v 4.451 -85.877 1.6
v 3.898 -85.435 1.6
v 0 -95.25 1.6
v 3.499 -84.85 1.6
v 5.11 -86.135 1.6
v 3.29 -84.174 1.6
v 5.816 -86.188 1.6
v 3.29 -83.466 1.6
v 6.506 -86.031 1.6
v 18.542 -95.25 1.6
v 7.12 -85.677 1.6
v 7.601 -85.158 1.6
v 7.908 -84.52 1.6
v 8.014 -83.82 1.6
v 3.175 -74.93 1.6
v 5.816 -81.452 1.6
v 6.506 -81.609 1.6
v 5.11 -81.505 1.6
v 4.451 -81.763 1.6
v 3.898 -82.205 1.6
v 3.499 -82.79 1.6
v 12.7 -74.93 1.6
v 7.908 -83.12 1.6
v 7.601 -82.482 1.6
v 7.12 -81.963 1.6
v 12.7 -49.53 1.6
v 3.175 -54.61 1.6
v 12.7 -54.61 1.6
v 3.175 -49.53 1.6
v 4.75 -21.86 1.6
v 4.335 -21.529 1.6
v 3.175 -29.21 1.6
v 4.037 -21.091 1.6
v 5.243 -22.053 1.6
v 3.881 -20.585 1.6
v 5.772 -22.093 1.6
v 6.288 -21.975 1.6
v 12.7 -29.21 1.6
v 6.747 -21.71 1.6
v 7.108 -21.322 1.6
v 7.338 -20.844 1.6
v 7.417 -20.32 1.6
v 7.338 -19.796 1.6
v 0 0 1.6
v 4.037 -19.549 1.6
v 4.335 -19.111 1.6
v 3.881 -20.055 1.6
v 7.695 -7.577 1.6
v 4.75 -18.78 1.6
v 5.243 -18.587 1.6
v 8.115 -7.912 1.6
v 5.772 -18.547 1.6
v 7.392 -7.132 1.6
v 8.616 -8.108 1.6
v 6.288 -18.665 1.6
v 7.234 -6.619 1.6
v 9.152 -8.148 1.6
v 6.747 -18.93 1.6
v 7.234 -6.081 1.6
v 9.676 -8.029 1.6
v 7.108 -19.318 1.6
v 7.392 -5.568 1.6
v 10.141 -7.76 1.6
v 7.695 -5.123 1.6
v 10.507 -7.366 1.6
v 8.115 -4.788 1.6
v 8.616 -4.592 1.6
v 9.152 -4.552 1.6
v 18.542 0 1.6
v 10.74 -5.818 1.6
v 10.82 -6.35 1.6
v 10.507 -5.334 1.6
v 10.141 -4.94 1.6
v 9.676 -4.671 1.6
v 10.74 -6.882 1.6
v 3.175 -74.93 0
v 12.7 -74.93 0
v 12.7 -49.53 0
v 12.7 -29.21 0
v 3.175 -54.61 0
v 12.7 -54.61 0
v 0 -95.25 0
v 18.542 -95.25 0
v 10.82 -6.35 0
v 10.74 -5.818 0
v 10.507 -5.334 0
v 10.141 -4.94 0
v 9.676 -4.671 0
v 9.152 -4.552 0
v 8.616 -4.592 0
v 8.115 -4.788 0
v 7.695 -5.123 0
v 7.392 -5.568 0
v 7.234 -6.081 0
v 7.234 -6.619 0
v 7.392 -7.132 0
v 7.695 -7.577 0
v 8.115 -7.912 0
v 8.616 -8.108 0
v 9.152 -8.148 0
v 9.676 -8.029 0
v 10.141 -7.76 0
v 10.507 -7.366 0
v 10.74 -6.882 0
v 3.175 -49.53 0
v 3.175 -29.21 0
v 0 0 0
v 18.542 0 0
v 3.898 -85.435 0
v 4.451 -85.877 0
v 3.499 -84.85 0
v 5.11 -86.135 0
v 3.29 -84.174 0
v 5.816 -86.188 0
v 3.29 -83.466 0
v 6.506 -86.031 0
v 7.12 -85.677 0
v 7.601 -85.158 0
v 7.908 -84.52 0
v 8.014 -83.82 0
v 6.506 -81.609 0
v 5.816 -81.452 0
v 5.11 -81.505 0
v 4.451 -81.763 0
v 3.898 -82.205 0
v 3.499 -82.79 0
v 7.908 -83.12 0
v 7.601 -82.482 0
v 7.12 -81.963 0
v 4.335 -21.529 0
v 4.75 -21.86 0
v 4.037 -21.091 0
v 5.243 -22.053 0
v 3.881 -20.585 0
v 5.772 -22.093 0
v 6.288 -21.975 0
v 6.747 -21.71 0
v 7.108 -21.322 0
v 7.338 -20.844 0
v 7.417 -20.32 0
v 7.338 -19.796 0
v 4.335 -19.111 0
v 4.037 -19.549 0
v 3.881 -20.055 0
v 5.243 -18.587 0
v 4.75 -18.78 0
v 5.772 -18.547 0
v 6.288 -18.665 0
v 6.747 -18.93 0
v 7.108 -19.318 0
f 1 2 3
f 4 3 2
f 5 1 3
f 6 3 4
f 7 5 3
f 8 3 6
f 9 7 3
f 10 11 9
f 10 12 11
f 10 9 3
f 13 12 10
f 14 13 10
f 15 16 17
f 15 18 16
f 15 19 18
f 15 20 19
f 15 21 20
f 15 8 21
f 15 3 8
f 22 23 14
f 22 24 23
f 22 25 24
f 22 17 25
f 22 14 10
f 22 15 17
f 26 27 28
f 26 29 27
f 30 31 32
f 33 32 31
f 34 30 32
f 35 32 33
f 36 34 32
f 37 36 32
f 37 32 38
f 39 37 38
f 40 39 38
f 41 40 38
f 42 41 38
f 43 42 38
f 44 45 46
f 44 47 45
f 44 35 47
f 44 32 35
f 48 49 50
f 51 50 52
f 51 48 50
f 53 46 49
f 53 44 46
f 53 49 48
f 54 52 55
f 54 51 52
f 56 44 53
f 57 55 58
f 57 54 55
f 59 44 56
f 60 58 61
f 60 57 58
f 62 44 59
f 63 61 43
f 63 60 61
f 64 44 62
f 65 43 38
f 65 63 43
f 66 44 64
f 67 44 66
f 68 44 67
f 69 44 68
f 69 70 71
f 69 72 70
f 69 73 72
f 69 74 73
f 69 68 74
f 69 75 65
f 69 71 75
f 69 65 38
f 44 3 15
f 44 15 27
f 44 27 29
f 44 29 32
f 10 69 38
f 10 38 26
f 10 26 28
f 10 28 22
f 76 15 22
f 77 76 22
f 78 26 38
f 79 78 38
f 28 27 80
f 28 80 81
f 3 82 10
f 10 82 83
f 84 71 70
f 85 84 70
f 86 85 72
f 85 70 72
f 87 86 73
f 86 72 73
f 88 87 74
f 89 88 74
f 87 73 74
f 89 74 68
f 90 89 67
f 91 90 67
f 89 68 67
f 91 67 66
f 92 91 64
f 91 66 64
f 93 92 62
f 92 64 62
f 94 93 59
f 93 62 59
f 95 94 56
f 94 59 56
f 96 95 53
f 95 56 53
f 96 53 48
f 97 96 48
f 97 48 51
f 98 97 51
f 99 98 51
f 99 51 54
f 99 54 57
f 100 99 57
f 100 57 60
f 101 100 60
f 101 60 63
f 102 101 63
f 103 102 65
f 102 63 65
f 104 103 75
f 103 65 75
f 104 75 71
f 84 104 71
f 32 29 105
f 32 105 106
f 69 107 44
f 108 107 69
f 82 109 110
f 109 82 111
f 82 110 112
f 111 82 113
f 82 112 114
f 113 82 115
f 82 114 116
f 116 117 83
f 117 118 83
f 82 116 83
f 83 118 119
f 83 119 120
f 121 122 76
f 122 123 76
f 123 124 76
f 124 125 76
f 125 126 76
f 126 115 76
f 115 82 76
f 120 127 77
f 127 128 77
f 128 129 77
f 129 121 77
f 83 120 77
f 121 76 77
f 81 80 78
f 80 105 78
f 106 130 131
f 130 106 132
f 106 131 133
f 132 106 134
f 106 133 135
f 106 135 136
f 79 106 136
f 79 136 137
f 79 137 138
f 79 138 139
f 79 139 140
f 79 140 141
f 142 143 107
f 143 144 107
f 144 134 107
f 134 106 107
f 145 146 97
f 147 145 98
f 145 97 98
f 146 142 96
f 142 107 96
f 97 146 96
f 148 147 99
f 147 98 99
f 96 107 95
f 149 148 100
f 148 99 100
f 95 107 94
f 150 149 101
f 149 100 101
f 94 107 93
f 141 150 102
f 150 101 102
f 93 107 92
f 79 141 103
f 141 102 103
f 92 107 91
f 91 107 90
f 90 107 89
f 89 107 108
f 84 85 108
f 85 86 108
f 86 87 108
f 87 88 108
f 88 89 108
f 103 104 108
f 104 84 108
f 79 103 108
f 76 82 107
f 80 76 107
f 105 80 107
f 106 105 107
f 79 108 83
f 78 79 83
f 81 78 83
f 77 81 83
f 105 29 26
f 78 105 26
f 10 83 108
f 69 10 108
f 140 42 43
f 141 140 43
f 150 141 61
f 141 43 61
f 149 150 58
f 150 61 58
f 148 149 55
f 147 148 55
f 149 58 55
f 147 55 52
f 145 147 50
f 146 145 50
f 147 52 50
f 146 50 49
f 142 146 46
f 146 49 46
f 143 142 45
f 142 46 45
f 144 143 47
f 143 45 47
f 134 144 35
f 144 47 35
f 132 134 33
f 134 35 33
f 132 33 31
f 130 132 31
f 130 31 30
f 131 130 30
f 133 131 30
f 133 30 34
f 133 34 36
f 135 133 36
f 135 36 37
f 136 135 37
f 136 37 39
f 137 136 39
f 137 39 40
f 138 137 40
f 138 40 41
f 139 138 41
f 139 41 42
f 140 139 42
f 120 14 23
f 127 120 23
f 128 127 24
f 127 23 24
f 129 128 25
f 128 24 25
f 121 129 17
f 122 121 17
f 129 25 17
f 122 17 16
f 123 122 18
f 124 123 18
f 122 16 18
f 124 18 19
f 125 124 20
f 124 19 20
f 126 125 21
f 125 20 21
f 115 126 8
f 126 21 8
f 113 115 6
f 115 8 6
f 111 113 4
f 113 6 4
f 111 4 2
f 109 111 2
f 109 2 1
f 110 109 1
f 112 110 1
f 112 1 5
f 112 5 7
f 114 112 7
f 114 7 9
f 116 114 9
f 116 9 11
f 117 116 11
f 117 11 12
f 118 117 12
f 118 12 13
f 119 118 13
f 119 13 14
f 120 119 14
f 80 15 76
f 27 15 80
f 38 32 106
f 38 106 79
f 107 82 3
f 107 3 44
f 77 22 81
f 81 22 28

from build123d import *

# Parameters (mm, degrees)
SKETCH1_W          = 18.542
SKETCH1_H          = 95.25
EXTRUDE1_DEPTH     = 1.6002
SKETCH2_R          = 1.8034
CUT_EXTRUDE1_DEPTH = 1.6002
SKETCH3_R          = 1.778
SKETCH3_R_2        = 2.3749
CUT_EXTRUDE2_DEPTH = 2.54
SKETCH4_W          = 9.525
SKETCH4_H          = 20.32
FIBER_HOLES_DEPTH  = 2.54


with BuildPart() as part:
    # Sketch1 → Extrude1 (new body)
    with BuildSketch(Plane.XY):
        with Locations((9.271, -47.625)):
            Rectangle(SKETCH1_W, SKETCH1_H)
    extrude(amount=EXTRUDE1_DEPTH)

    # Sketch2 → Cut-Extrude1 (cut)
    with BuildSketch(Plane.XY.offset(1.6002)):
        with Locations((9.017, -6.35)):
            Circle(SKETCH2_R)
    extrude(amount=-CUT_EXTRUDE1_DEPTH, mode=Mode.SUBTRACT)

    # Sketch3 → Cut-Extrude2 (cut)
    with BuildSketch(Plane.XY.offset(1.6002)):
        with Locations((5.6388, -20.32)):
            Circle(SKETCH3_R)
        with Locations((5.6388, -83.82)):
            Circle(SKETCH3_R_2)
    extrude(amount=-CUT_EXTRUDE2_DEPTH, mode=Mode.SUBTRACT)

    # Sketch4 → Fiber Holes (cut)
    with BuildSketch(Plane.XY.offset(1.6002)):
        with Locations((7.9375, -39.37)):
            Rectangle(SKETCH4_W, SKETCH4_H)
        with Locations((7.9375, -64.77)):
            Rectangle(SKETCH4_W, SKETCH4_H)
    extrude(amount=-FIBER_HOLES_DEPTH, mode=Mode.SUBTRACT)


solid = part.part
